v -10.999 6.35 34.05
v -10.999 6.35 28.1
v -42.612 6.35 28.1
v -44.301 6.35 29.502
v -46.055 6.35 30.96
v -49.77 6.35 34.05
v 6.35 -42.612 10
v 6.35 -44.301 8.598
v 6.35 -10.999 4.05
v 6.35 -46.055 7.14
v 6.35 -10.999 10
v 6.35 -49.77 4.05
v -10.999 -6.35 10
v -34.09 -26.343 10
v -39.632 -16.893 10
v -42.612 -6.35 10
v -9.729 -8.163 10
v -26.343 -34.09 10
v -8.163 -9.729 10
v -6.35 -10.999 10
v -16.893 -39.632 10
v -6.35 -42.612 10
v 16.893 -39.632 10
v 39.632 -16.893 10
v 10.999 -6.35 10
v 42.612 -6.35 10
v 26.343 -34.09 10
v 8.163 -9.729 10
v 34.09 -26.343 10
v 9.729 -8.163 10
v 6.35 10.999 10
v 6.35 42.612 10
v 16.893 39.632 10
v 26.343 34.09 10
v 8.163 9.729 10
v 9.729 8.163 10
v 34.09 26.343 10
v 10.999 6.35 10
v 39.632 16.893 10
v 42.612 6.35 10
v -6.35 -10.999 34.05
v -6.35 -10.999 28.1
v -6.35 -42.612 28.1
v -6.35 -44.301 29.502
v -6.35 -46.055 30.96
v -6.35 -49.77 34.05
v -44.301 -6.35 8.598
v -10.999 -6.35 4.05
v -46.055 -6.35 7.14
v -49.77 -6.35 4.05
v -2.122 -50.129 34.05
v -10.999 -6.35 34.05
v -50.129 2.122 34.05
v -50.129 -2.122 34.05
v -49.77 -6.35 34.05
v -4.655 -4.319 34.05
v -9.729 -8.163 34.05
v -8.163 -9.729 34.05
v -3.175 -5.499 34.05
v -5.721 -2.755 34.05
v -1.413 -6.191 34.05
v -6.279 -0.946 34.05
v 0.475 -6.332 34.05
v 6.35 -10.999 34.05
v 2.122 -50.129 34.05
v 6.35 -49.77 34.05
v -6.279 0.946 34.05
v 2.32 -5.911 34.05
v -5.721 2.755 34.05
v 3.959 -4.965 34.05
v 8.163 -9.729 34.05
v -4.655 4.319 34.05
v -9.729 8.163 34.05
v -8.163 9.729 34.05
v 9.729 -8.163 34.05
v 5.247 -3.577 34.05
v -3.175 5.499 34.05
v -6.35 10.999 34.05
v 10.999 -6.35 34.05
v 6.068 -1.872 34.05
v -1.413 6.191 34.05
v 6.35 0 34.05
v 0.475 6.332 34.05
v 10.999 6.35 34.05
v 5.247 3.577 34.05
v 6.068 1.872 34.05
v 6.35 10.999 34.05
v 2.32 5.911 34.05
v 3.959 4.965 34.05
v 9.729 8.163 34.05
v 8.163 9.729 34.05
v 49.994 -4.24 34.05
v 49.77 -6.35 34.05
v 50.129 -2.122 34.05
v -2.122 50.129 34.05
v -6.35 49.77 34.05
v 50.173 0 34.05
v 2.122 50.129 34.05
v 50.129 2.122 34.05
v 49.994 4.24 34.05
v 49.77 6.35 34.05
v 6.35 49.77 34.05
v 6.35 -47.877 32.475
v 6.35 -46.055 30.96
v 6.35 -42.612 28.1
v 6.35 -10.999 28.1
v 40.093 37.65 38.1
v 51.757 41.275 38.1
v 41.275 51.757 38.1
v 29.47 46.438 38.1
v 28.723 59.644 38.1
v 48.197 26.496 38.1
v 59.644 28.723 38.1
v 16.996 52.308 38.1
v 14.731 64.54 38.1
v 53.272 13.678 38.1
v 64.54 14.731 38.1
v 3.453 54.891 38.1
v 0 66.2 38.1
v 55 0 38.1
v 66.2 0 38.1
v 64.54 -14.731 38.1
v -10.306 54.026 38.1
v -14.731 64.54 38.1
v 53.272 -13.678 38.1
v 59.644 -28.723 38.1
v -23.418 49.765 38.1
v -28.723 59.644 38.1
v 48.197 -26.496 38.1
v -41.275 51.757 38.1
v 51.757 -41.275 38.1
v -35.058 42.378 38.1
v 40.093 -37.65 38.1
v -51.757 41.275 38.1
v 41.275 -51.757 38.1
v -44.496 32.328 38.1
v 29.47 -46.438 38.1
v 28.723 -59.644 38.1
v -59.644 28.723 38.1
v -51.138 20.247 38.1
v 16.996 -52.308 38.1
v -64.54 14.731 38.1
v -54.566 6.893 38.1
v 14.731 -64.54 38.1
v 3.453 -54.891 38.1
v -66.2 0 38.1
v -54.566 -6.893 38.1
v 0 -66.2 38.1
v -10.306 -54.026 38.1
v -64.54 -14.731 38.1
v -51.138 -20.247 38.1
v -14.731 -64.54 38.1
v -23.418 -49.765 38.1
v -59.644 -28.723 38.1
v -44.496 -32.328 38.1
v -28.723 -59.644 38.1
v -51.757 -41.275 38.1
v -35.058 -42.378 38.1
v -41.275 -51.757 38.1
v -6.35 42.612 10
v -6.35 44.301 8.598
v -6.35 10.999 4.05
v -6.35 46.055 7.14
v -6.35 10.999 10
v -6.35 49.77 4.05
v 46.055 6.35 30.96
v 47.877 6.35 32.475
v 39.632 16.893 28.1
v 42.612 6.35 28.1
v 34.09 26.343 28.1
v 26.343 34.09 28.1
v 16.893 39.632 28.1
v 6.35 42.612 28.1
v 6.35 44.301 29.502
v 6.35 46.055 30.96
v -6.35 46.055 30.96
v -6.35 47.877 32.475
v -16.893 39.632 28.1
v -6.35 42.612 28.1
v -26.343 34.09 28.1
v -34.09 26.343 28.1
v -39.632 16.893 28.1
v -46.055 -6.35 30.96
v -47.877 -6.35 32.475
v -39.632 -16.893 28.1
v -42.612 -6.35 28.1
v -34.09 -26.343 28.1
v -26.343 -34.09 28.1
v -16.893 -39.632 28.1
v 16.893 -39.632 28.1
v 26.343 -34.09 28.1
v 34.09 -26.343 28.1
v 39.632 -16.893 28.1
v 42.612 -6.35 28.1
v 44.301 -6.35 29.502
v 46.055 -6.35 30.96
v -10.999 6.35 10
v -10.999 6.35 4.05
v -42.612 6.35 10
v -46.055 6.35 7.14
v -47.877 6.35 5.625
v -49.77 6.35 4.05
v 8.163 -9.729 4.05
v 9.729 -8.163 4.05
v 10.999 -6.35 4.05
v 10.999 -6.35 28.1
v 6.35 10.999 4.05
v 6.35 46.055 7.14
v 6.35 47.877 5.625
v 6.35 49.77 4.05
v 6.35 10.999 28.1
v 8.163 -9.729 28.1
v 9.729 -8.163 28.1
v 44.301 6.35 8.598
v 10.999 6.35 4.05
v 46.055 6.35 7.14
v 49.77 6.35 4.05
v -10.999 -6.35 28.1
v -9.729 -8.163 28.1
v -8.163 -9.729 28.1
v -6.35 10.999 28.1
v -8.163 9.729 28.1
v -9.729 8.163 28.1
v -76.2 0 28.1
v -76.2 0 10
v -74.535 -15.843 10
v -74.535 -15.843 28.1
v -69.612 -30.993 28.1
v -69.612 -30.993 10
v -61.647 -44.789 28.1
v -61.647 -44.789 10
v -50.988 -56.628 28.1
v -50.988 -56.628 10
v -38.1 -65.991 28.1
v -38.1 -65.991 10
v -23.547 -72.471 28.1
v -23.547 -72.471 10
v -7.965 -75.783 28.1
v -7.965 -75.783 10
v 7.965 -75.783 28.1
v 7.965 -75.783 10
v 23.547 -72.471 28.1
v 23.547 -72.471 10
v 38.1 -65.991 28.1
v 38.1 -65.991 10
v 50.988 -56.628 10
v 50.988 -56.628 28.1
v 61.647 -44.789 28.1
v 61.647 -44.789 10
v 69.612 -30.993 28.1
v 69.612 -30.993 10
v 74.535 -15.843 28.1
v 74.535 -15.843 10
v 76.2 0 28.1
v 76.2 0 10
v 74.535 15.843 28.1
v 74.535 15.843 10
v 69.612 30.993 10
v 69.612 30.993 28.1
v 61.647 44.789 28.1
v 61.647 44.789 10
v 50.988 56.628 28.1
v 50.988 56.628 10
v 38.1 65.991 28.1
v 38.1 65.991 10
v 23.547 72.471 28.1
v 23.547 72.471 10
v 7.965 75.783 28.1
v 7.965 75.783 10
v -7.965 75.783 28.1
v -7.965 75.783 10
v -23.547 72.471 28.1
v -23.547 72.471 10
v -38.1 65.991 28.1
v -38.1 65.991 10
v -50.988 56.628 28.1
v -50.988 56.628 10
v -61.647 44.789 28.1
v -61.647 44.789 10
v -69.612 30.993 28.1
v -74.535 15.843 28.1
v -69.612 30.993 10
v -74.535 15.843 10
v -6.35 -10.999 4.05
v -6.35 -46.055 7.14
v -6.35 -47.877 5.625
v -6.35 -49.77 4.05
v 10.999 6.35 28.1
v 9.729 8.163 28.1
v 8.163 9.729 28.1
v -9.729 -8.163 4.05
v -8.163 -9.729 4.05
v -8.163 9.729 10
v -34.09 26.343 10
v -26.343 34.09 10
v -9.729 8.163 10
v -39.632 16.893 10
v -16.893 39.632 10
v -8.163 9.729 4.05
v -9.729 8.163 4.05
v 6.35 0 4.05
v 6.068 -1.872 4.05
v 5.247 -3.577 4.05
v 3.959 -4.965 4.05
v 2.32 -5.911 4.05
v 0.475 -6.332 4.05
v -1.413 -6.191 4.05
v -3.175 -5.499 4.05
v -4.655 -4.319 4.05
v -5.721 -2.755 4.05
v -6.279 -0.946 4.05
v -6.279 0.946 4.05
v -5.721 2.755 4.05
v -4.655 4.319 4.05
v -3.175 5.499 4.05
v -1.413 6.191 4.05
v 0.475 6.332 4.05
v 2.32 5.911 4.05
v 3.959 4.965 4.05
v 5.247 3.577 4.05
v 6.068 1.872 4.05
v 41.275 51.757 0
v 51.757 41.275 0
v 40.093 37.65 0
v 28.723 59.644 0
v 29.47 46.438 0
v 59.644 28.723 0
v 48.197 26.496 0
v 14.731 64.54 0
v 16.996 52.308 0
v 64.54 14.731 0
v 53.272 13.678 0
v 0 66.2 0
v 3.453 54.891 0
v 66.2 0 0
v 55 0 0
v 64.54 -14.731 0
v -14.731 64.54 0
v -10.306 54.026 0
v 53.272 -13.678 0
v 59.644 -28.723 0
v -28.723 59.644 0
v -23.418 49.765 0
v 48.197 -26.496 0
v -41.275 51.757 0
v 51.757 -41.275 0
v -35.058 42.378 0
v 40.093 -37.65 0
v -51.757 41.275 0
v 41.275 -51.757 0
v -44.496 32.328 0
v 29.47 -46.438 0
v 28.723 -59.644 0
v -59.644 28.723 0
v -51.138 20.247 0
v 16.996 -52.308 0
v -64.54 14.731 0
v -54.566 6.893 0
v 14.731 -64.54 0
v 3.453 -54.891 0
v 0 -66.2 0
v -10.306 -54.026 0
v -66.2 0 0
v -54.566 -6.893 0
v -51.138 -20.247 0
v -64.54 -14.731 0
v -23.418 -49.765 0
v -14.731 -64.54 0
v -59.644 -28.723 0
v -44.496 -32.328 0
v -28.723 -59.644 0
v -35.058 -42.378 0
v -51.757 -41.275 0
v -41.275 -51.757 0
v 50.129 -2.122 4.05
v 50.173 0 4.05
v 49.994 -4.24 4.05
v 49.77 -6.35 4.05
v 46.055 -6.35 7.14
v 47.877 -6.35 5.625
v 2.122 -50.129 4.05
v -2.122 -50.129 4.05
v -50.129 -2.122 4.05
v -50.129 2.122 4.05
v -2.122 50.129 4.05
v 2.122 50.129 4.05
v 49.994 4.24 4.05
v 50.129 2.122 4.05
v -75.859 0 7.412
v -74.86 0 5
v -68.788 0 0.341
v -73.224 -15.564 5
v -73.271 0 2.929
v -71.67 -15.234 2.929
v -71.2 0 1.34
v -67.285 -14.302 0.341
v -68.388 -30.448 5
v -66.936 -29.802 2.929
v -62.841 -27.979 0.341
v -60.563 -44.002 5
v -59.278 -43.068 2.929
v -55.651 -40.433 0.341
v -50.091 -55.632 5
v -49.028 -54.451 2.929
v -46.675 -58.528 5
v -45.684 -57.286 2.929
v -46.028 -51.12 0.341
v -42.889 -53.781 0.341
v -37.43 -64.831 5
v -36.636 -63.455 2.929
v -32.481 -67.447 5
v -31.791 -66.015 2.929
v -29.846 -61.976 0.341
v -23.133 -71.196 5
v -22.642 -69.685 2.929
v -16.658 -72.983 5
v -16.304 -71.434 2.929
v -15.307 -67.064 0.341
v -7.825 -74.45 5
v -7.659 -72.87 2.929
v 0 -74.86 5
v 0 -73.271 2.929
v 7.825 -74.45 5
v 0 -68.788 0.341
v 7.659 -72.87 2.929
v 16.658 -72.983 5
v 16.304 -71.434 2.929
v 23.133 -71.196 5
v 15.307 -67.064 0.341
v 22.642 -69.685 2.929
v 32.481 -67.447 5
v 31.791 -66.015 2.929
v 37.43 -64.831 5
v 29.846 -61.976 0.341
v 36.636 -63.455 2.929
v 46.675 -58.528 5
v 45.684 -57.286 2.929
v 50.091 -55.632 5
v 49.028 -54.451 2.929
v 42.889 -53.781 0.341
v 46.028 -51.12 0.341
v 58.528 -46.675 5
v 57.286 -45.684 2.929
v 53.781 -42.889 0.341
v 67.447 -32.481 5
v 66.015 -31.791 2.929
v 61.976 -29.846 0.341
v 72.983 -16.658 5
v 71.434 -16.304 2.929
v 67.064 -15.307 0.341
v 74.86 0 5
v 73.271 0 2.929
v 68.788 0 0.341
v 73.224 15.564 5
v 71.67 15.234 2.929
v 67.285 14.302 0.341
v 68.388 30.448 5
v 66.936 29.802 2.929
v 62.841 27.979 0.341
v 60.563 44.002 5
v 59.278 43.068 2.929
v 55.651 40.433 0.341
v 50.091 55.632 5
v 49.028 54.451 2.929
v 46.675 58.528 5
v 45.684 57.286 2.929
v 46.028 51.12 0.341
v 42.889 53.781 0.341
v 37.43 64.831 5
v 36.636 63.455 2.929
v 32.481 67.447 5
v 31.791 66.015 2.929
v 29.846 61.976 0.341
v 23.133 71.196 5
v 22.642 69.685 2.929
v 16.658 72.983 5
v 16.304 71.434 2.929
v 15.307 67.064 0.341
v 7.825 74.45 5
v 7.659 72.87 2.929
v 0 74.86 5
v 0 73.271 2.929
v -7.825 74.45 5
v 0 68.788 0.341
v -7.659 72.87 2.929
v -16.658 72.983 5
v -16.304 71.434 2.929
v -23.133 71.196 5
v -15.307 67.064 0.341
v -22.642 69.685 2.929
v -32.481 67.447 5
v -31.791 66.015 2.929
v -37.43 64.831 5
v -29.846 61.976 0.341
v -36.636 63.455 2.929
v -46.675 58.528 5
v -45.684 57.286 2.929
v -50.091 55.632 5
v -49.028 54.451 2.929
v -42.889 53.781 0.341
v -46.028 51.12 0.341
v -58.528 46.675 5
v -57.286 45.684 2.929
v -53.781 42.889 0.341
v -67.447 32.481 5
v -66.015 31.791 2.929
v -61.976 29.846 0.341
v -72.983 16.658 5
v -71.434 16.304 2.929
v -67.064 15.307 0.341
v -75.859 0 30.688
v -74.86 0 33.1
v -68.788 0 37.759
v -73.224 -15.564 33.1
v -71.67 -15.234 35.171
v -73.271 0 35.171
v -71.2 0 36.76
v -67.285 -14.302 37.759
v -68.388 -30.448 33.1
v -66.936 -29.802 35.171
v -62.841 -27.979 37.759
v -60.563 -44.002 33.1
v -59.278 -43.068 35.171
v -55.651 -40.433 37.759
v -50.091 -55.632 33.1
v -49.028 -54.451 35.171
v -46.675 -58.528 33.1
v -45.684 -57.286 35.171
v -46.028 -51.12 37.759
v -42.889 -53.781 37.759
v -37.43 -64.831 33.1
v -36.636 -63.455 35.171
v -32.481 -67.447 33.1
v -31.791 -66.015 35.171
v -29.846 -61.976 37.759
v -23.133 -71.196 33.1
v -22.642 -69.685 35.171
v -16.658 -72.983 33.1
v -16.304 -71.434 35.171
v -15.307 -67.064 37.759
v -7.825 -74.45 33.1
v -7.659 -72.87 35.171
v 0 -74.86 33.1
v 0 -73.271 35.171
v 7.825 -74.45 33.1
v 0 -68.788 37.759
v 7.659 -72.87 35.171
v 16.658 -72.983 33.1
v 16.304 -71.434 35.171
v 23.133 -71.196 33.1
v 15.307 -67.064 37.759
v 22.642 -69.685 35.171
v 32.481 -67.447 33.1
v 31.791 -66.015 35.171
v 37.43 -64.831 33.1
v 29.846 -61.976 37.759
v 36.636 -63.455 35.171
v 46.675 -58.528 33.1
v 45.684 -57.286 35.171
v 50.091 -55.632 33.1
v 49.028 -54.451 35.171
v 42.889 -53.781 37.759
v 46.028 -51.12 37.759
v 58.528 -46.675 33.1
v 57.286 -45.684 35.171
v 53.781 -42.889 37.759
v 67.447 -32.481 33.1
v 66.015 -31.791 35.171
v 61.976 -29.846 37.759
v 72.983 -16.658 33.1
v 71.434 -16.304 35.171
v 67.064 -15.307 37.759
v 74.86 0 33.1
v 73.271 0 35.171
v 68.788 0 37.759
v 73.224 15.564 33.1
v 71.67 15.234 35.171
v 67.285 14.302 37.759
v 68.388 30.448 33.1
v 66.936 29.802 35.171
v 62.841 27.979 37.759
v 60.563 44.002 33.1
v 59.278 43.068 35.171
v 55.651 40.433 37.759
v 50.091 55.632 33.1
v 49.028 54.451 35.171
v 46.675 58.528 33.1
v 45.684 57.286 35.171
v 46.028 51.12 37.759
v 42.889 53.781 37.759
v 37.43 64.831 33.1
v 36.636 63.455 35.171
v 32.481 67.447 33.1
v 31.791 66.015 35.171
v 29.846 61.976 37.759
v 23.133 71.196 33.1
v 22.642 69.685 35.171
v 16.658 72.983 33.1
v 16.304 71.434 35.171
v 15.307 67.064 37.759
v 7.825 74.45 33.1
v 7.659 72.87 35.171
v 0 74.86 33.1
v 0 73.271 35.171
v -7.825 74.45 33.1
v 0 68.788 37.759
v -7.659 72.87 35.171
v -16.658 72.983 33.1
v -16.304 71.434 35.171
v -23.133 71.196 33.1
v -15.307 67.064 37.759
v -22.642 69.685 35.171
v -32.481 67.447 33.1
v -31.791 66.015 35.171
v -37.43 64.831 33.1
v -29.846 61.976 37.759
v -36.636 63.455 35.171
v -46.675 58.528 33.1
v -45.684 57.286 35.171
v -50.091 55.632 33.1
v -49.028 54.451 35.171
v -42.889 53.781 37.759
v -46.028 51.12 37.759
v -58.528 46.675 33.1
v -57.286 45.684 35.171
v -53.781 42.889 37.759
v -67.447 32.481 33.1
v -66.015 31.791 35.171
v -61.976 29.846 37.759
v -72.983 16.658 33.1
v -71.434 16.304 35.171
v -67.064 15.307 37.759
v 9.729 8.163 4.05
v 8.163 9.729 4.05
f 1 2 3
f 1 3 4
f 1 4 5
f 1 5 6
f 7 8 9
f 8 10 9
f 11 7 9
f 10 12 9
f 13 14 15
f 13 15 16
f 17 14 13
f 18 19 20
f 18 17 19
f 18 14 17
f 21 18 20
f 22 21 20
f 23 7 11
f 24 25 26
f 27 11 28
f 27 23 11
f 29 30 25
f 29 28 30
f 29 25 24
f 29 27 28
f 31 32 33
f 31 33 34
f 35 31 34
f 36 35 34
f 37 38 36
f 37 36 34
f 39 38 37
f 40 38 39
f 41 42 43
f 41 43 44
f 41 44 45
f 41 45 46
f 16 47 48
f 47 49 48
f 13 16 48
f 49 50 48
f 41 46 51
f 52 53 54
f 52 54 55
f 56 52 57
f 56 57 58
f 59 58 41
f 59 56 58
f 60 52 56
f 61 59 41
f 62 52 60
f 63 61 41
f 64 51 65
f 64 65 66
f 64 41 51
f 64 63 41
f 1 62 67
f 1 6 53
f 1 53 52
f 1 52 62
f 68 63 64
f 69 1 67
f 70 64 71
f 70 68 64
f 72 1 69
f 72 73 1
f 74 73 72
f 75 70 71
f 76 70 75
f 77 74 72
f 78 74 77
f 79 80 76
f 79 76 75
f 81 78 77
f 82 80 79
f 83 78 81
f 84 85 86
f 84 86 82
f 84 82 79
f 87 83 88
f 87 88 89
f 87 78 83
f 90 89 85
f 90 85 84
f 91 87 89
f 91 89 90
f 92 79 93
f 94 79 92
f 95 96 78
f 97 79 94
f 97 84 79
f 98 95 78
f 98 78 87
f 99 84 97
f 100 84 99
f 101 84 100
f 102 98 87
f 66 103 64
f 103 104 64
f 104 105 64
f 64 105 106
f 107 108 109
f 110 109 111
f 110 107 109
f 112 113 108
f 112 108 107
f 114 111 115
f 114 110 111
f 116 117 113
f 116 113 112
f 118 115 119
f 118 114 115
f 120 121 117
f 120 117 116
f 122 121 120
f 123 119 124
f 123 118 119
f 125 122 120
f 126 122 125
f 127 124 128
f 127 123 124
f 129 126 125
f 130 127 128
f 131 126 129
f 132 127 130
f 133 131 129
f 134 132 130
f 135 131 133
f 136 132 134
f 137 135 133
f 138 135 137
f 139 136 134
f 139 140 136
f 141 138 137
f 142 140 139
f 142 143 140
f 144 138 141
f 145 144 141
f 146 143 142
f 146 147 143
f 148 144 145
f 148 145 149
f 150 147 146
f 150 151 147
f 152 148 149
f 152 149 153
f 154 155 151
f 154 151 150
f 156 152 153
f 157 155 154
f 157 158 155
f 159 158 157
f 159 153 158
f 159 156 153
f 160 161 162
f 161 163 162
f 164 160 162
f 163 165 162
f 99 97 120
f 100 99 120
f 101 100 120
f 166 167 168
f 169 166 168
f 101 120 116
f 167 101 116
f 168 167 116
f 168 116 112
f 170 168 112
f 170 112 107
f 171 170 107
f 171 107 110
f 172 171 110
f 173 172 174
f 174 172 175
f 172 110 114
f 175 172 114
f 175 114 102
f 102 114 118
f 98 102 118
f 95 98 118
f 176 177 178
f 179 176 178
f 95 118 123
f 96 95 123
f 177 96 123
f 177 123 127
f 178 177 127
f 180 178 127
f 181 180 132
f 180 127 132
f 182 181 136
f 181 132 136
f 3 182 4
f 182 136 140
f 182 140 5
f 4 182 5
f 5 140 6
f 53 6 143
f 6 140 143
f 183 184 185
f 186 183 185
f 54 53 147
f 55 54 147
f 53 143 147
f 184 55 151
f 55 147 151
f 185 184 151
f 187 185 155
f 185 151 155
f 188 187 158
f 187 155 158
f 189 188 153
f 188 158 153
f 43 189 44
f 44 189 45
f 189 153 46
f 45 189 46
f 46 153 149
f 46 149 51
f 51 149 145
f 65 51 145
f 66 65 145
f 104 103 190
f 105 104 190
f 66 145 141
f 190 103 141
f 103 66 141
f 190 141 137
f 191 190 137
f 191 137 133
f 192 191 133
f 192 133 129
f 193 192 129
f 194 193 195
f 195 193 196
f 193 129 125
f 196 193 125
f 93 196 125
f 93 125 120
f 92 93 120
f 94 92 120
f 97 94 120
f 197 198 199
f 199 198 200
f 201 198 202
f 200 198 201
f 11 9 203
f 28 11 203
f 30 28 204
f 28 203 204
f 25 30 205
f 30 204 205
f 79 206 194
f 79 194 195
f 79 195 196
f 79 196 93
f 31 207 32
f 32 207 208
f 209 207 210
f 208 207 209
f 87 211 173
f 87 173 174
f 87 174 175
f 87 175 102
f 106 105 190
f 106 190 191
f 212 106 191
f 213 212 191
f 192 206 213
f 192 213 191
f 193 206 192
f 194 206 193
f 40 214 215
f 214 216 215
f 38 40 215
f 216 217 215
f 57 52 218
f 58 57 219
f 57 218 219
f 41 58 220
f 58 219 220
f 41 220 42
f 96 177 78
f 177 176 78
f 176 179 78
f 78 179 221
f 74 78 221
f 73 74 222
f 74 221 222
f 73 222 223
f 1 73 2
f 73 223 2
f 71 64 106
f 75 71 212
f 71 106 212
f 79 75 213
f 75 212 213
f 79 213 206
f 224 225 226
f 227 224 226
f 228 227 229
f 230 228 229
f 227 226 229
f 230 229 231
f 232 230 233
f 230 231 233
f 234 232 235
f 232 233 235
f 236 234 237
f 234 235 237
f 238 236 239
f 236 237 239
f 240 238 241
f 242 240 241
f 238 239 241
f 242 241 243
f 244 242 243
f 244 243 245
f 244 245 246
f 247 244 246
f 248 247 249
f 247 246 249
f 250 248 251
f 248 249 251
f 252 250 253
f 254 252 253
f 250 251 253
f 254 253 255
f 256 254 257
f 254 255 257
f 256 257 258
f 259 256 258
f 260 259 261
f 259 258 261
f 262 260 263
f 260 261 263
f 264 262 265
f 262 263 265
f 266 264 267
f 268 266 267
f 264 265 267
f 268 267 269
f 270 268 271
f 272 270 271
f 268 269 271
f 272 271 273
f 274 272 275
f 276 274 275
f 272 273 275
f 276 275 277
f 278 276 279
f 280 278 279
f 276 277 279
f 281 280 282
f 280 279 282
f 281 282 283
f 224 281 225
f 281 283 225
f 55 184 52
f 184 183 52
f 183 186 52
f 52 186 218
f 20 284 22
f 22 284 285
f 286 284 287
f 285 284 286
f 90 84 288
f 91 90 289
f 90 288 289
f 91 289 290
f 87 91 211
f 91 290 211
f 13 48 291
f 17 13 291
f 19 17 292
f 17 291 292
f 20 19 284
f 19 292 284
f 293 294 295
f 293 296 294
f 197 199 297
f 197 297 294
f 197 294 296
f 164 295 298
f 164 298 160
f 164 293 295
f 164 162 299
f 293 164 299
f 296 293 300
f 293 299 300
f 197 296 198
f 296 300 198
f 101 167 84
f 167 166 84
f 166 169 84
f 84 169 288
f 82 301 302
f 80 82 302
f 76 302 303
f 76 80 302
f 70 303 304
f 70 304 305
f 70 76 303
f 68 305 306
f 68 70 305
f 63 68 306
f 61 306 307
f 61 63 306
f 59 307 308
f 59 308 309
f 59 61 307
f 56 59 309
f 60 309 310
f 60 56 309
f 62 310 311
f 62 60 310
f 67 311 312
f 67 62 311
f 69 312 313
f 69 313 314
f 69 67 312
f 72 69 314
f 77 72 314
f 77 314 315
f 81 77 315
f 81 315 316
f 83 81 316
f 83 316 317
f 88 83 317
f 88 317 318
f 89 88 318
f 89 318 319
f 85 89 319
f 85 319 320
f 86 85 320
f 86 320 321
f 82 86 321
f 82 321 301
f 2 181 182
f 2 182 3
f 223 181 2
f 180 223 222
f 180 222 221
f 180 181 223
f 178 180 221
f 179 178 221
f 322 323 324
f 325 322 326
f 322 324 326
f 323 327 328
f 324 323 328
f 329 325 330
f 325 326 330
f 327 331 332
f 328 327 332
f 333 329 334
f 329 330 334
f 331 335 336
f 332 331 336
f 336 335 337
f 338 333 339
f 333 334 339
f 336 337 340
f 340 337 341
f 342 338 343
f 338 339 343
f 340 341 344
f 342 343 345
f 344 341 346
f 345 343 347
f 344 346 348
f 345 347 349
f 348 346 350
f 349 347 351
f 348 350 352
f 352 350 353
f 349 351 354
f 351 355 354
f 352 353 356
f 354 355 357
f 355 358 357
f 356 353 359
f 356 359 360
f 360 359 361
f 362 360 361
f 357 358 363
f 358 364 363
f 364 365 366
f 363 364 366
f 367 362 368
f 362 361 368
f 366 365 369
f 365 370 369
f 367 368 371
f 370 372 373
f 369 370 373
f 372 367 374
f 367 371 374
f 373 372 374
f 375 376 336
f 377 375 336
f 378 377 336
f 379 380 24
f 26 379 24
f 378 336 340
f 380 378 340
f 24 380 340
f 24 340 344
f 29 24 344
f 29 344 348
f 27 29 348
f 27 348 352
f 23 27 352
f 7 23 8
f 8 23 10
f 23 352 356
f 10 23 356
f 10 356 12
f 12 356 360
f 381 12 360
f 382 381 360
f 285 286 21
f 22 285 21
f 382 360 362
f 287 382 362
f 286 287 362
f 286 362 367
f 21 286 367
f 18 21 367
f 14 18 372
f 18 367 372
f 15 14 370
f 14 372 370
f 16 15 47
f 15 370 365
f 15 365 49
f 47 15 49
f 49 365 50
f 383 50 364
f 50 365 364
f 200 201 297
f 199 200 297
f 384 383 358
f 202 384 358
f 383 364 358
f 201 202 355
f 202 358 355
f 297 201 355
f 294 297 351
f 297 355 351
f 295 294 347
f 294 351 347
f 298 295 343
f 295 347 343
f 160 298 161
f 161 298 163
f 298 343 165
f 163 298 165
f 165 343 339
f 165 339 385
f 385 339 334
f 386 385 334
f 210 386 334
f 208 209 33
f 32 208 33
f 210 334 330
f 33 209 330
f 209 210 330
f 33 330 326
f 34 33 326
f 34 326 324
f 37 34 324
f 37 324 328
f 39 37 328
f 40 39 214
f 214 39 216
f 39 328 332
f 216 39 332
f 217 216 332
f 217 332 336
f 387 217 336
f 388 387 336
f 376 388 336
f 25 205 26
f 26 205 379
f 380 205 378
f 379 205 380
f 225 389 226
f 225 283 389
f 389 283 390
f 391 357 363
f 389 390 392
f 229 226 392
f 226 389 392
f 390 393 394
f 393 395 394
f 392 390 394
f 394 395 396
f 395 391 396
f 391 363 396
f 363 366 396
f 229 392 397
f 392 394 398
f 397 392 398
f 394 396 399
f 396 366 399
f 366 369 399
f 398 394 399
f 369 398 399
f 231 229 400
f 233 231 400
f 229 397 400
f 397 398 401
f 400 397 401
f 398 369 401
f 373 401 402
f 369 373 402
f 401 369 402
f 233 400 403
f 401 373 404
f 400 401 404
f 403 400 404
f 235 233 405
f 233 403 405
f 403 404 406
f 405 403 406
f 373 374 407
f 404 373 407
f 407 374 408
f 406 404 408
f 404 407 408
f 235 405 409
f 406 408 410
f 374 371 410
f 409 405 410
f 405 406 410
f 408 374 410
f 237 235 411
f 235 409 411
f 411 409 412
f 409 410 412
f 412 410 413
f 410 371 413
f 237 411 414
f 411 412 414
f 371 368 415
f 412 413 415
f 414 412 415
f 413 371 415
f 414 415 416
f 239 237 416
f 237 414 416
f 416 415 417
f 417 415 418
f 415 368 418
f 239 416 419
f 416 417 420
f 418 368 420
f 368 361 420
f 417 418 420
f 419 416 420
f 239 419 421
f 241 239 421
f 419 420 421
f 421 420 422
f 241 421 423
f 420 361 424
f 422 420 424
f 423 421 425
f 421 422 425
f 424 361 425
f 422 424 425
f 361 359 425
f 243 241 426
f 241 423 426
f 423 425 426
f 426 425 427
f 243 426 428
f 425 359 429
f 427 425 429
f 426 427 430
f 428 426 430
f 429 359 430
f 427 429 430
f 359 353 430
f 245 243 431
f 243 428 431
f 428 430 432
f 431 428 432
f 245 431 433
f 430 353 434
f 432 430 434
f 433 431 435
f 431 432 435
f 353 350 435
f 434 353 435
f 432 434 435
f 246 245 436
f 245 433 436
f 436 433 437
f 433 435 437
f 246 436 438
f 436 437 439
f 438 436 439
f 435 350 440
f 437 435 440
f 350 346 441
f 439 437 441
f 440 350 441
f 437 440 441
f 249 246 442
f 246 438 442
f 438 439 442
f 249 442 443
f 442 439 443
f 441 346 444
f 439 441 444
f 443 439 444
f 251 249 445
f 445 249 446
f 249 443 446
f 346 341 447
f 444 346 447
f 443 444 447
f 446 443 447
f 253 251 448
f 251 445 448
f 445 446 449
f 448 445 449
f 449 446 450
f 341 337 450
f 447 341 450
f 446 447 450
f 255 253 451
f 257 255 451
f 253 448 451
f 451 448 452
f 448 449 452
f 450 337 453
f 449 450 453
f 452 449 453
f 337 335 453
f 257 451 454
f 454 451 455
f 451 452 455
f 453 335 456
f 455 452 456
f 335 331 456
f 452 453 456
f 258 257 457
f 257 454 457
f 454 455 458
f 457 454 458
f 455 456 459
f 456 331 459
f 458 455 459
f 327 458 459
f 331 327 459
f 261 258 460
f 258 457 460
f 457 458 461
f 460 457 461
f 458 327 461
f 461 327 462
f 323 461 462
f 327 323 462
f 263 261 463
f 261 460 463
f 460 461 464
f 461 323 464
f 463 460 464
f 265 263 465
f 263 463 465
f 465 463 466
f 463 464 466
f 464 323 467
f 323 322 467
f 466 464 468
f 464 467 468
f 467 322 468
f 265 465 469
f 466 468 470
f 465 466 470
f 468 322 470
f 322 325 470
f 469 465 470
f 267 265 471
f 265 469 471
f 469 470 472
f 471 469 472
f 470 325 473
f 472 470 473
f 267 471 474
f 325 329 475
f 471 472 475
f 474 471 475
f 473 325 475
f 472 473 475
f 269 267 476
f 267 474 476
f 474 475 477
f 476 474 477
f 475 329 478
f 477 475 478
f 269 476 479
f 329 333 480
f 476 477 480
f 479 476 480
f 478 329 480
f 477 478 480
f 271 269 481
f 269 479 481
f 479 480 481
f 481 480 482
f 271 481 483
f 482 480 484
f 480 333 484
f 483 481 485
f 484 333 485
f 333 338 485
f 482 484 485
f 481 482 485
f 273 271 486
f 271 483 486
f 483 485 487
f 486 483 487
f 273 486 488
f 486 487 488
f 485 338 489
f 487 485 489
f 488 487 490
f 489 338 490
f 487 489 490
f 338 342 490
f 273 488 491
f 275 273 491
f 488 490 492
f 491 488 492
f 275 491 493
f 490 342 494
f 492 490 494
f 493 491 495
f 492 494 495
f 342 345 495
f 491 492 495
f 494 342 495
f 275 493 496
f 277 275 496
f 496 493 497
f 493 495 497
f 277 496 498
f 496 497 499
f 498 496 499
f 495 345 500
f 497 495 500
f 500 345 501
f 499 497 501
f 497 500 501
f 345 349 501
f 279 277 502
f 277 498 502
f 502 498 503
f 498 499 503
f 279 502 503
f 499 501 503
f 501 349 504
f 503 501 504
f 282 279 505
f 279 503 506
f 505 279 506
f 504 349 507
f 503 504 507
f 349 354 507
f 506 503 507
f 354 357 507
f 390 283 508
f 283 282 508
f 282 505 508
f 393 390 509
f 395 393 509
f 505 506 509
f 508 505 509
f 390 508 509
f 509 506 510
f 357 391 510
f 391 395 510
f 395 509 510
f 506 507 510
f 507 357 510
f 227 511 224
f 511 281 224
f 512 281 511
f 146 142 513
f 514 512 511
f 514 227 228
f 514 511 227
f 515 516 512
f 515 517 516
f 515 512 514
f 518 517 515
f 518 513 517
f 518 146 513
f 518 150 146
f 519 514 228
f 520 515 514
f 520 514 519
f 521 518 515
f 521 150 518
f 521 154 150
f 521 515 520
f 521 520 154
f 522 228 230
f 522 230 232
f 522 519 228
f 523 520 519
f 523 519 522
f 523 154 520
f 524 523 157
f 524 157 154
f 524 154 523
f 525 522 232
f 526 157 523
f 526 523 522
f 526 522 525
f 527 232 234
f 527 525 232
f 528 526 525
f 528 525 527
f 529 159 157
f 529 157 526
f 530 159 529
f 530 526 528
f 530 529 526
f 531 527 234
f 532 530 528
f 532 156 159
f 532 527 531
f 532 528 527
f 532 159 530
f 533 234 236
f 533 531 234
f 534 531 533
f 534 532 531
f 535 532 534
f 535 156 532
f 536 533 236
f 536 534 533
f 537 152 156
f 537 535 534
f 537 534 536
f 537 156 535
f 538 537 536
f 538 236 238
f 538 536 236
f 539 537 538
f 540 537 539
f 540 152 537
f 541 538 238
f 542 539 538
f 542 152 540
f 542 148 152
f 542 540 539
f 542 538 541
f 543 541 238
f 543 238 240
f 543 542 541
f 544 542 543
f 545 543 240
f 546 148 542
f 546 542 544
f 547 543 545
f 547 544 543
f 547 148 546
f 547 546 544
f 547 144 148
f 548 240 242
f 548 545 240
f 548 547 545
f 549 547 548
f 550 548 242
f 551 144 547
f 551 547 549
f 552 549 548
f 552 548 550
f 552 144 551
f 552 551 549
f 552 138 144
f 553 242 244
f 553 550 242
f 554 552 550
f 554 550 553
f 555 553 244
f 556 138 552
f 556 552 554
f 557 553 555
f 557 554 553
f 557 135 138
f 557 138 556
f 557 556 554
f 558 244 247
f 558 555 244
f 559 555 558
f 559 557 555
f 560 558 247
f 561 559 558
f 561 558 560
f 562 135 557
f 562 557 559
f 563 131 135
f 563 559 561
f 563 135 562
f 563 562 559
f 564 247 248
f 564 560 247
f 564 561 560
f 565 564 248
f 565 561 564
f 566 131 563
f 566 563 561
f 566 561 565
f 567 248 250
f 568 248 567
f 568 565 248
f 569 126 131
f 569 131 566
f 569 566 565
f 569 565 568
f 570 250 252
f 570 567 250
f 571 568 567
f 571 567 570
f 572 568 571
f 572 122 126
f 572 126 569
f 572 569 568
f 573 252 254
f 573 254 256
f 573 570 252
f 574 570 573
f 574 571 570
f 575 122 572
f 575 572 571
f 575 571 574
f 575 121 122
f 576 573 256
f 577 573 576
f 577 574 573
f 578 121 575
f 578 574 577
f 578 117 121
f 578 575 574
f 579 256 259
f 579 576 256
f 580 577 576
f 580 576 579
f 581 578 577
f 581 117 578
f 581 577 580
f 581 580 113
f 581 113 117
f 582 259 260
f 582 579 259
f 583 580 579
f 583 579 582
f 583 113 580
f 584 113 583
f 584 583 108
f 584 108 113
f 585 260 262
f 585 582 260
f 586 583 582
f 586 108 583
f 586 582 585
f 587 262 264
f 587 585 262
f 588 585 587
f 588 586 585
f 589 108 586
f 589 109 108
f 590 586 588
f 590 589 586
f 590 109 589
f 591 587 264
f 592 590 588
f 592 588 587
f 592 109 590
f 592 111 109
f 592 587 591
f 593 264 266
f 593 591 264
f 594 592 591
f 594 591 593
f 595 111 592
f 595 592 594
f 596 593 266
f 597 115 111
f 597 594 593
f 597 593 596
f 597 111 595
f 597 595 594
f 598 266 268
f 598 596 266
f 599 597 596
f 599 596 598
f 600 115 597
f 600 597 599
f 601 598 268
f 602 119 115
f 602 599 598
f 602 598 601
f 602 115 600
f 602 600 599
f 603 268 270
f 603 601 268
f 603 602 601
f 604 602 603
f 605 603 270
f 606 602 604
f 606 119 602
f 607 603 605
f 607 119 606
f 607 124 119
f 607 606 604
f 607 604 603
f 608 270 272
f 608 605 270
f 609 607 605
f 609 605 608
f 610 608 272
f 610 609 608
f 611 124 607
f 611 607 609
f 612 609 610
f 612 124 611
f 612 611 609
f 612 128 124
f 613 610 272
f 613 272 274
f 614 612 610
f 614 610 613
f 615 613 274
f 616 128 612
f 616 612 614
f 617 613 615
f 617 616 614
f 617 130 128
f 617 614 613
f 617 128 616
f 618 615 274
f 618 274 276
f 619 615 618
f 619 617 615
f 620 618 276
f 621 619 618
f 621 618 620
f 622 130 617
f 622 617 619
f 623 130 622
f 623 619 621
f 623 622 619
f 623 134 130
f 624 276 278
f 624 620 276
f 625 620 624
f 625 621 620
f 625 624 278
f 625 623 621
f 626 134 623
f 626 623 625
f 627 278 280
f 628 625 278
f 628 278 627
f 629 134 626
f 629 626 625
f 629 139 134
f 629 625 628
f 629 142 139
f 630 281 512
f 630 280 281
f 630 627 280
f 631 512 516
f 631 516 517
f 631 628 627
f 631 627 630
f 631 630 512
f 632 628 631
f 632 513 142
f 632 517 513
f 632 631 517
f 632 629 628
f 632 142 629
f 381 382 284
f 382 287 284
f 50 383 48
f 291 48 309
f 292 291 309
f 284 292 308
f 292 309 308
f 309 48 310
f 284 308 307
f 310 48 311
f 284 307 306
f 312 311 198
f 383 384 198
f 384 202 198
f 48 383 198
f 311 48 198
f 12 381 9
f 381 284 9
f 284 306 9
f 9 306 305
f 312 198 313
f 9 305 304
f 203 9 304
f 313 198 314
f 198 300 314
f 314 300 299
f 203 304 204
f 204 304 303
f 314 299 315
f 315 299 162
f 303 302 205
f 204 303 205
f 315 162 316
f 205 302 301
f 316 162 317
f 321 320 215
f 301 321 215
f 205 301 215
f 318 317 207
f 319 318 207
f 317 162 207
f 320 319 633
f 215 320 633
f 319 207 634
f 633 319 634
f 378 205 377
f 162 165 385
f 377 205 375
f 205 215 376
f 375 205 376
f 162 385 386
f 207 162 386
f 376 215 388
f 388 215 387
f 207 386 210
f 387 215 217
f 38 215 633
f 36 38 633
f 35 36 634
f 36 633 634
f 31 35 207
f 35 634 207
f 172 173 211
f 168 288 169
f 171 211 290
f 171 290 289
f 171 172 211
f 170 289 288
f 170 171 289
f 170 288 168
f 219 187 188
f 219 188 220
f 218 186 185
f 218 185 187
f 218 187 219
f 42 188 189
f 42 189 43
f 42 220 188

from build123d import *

# Parameters (mm, degrees)
SKETCH1_R               = 76.2
BOSS_EXTRUDE1_DEPTH     = 38.1
FILLET1_R               = 10
SKETCH2_R               = 6.35
CUT_EXTRUDE1_DEPTH      = 38.1
SKETCH3_R               = 55
CUT_EXTRUDE2_DEPTH      = 10
CUT_EXTRUDE2_DRAFT      = -50
MIRROR1_COPY_1_SKETCH_R = 55
MIRROR1_COPY_1_DEPTH    = 10
MIRROR1_COPY_1_DRAFT    = -50
SKETCH4_R               = 6.35
BOSS_EXTRUDE3_DEPTH     = 15


with BuildPart() as part:
    # Sketch1 → Boss-Extrude1 (new body)
    with BuildSketch(Plane.XY):
        with Locations(Location((0, 0, 0), (0, 0, 180))):
            Circle(SKETCH1_R)
    extrude(amount=BOSS_EXTRUDE1_DEPTH)

    # Fillet1
    fillet1_edges = [part.edges().sort_by_distance(p)[0] for p in [
        (76.2, 0, 0),
        (76.2, 0, 38.1),
    ]]
    fillet(fillet1_edges, radius=FILLET1_R)

    # Sketch2 → Cut-Extrude1 (cut)
    with BuildSketch(Plane.XY.offset(38.1)):
        Circle(SKETCH2_R)
    extrude(amount=-CUT_EXTRUDE1_DEPTH, mode=Mode.SUBTRACT)


with BuildPart() as cut_extrude2_tool:
    # Sketch3 → Cut-Extrude2 (with draft: the straight prism first)
    with BuildSketch(Plane.XY.offset(38.1)):
        Circle(SKETCH3_R)
    extrude(amount=-CUT_EXTRUDE2_DEPTH)
    # Cut-Extrude2: the draft: its side faces are tilted about the plane it starts from
    cut_extrude2_sides = [cut_extrude2_tool.faces().sort_by_distance(p)[0] for p in [
        (-55, 0, 33.1),
    ]]
    draft(cut_extrude2_sides, Plane.XY.offset(38.1), CUT_EXTRUDE2_DRAFT)


with BuildPart() as part_1:
    add(part.part)

    # Cut-Extrude2: cut by cut_extrude2_tool
    add(cut_extrude2_tool.part, mode=Mode.SUBTRACT)


with BuildPart() as mirror1_copy_1_tool:
    # Mirror1 copy 1 sketch → Mirror1 copy 1 (with draft: the straight prism first)
    with BuildSketch(Plane(origin=(0, 0, 0), x_dir=(1, 0, 0), z_dir=(0, 0, -1))):
        Circle(MIRROR1_COPY_1_SKETCH_R)
    extrude(amount=-MIRROR1_COPY_1_DEPTH)
    # Mirror1 copy 1: the draft: its side faces are tilted about the plane it starts from
    mirror1_copy_1_sides = [mirror1_copy_1_tool.faces().sort_by_distance(p)[0] for p in [
        (-55, 0, 5),
    ]]
    draft(mirror1_copy_1_sides, Plane(origin=(0, 0, 0), x_dir=(1, 0, 0), z_dir=(0, 0, -1)), MIRROR1_COPY_1_DRAFT)


with BuildPart() as part_2:
    add(part_1.part)

    # Mirror1 copy 1: cut by mirror1_copy_1_tool
    add(mirror1_copy_1_tool.part, mode=Mode.SUBTRACT)

    # Sketch4 → Boss-Extrude3 (add, symmetric)
    with BuildSketch(Plane(origin=(0, 0, 19.05), x_dir=(-1, 0, 0), z_dir=(0, 0, -1))):
        with BuildLine():
            Line((10.998522628, 6.35), (54.632202042, 6.35))
            Line((54.632202042, 6.35), (54.632202042, -6.35))
            Line((54.632202042, -6.35), (10.998522628, -6.35))
            ThreePointArc((10.998522628, -6.35), (8.980256121, -8.980256121), (6.35, -10.998522628))
            Line((6.35, -10.998522628), (6.35, -54.632202042))
            Line((6.35, -54.632202042), (-6.35, -54.632202042))
            Line((-6.35, -54.632202042), (-6.35, -10.998522628))
            ThreePointArc((-6.35, -10.998522628), (-8.980256121, -8.980256121), (-10.998522628, -6.35))
            Line((-10.998522628, -6.35), (-54.632202042, -6.35))
            Line((-54.632202042, -6.35), (-54.632202042, 6.35))
            Line((-54.632202042, 6.35), (-10.998522628, 6.35))
            ThreePointArc((-10.998522628, 6.35), (-8.980256121, 8.980256121), (-6.35, 10.998522628))
            Line((-6.35, 10.998522628), (-6.35, 54.632202042))
            Line((-6.35, 54.632202042), (6.35, 54.632202042))
            Line((6.35, 54.632202042), (6.35, 10.998522628))
            ThreePointArc((6.35, 10.998522628), (8.980256121, 8.980256121), (10.998522628, 6.35))
        make_face()
        with Locations(Location((0, 0, 0), (0, 0, 180))):
            Circle(SKETCH4_R, mode=Mode.SUBTRACT)
    extrude(amount=BOSS_EXTRUDE3_DEPTH, both=True)


solid = part_2.part
